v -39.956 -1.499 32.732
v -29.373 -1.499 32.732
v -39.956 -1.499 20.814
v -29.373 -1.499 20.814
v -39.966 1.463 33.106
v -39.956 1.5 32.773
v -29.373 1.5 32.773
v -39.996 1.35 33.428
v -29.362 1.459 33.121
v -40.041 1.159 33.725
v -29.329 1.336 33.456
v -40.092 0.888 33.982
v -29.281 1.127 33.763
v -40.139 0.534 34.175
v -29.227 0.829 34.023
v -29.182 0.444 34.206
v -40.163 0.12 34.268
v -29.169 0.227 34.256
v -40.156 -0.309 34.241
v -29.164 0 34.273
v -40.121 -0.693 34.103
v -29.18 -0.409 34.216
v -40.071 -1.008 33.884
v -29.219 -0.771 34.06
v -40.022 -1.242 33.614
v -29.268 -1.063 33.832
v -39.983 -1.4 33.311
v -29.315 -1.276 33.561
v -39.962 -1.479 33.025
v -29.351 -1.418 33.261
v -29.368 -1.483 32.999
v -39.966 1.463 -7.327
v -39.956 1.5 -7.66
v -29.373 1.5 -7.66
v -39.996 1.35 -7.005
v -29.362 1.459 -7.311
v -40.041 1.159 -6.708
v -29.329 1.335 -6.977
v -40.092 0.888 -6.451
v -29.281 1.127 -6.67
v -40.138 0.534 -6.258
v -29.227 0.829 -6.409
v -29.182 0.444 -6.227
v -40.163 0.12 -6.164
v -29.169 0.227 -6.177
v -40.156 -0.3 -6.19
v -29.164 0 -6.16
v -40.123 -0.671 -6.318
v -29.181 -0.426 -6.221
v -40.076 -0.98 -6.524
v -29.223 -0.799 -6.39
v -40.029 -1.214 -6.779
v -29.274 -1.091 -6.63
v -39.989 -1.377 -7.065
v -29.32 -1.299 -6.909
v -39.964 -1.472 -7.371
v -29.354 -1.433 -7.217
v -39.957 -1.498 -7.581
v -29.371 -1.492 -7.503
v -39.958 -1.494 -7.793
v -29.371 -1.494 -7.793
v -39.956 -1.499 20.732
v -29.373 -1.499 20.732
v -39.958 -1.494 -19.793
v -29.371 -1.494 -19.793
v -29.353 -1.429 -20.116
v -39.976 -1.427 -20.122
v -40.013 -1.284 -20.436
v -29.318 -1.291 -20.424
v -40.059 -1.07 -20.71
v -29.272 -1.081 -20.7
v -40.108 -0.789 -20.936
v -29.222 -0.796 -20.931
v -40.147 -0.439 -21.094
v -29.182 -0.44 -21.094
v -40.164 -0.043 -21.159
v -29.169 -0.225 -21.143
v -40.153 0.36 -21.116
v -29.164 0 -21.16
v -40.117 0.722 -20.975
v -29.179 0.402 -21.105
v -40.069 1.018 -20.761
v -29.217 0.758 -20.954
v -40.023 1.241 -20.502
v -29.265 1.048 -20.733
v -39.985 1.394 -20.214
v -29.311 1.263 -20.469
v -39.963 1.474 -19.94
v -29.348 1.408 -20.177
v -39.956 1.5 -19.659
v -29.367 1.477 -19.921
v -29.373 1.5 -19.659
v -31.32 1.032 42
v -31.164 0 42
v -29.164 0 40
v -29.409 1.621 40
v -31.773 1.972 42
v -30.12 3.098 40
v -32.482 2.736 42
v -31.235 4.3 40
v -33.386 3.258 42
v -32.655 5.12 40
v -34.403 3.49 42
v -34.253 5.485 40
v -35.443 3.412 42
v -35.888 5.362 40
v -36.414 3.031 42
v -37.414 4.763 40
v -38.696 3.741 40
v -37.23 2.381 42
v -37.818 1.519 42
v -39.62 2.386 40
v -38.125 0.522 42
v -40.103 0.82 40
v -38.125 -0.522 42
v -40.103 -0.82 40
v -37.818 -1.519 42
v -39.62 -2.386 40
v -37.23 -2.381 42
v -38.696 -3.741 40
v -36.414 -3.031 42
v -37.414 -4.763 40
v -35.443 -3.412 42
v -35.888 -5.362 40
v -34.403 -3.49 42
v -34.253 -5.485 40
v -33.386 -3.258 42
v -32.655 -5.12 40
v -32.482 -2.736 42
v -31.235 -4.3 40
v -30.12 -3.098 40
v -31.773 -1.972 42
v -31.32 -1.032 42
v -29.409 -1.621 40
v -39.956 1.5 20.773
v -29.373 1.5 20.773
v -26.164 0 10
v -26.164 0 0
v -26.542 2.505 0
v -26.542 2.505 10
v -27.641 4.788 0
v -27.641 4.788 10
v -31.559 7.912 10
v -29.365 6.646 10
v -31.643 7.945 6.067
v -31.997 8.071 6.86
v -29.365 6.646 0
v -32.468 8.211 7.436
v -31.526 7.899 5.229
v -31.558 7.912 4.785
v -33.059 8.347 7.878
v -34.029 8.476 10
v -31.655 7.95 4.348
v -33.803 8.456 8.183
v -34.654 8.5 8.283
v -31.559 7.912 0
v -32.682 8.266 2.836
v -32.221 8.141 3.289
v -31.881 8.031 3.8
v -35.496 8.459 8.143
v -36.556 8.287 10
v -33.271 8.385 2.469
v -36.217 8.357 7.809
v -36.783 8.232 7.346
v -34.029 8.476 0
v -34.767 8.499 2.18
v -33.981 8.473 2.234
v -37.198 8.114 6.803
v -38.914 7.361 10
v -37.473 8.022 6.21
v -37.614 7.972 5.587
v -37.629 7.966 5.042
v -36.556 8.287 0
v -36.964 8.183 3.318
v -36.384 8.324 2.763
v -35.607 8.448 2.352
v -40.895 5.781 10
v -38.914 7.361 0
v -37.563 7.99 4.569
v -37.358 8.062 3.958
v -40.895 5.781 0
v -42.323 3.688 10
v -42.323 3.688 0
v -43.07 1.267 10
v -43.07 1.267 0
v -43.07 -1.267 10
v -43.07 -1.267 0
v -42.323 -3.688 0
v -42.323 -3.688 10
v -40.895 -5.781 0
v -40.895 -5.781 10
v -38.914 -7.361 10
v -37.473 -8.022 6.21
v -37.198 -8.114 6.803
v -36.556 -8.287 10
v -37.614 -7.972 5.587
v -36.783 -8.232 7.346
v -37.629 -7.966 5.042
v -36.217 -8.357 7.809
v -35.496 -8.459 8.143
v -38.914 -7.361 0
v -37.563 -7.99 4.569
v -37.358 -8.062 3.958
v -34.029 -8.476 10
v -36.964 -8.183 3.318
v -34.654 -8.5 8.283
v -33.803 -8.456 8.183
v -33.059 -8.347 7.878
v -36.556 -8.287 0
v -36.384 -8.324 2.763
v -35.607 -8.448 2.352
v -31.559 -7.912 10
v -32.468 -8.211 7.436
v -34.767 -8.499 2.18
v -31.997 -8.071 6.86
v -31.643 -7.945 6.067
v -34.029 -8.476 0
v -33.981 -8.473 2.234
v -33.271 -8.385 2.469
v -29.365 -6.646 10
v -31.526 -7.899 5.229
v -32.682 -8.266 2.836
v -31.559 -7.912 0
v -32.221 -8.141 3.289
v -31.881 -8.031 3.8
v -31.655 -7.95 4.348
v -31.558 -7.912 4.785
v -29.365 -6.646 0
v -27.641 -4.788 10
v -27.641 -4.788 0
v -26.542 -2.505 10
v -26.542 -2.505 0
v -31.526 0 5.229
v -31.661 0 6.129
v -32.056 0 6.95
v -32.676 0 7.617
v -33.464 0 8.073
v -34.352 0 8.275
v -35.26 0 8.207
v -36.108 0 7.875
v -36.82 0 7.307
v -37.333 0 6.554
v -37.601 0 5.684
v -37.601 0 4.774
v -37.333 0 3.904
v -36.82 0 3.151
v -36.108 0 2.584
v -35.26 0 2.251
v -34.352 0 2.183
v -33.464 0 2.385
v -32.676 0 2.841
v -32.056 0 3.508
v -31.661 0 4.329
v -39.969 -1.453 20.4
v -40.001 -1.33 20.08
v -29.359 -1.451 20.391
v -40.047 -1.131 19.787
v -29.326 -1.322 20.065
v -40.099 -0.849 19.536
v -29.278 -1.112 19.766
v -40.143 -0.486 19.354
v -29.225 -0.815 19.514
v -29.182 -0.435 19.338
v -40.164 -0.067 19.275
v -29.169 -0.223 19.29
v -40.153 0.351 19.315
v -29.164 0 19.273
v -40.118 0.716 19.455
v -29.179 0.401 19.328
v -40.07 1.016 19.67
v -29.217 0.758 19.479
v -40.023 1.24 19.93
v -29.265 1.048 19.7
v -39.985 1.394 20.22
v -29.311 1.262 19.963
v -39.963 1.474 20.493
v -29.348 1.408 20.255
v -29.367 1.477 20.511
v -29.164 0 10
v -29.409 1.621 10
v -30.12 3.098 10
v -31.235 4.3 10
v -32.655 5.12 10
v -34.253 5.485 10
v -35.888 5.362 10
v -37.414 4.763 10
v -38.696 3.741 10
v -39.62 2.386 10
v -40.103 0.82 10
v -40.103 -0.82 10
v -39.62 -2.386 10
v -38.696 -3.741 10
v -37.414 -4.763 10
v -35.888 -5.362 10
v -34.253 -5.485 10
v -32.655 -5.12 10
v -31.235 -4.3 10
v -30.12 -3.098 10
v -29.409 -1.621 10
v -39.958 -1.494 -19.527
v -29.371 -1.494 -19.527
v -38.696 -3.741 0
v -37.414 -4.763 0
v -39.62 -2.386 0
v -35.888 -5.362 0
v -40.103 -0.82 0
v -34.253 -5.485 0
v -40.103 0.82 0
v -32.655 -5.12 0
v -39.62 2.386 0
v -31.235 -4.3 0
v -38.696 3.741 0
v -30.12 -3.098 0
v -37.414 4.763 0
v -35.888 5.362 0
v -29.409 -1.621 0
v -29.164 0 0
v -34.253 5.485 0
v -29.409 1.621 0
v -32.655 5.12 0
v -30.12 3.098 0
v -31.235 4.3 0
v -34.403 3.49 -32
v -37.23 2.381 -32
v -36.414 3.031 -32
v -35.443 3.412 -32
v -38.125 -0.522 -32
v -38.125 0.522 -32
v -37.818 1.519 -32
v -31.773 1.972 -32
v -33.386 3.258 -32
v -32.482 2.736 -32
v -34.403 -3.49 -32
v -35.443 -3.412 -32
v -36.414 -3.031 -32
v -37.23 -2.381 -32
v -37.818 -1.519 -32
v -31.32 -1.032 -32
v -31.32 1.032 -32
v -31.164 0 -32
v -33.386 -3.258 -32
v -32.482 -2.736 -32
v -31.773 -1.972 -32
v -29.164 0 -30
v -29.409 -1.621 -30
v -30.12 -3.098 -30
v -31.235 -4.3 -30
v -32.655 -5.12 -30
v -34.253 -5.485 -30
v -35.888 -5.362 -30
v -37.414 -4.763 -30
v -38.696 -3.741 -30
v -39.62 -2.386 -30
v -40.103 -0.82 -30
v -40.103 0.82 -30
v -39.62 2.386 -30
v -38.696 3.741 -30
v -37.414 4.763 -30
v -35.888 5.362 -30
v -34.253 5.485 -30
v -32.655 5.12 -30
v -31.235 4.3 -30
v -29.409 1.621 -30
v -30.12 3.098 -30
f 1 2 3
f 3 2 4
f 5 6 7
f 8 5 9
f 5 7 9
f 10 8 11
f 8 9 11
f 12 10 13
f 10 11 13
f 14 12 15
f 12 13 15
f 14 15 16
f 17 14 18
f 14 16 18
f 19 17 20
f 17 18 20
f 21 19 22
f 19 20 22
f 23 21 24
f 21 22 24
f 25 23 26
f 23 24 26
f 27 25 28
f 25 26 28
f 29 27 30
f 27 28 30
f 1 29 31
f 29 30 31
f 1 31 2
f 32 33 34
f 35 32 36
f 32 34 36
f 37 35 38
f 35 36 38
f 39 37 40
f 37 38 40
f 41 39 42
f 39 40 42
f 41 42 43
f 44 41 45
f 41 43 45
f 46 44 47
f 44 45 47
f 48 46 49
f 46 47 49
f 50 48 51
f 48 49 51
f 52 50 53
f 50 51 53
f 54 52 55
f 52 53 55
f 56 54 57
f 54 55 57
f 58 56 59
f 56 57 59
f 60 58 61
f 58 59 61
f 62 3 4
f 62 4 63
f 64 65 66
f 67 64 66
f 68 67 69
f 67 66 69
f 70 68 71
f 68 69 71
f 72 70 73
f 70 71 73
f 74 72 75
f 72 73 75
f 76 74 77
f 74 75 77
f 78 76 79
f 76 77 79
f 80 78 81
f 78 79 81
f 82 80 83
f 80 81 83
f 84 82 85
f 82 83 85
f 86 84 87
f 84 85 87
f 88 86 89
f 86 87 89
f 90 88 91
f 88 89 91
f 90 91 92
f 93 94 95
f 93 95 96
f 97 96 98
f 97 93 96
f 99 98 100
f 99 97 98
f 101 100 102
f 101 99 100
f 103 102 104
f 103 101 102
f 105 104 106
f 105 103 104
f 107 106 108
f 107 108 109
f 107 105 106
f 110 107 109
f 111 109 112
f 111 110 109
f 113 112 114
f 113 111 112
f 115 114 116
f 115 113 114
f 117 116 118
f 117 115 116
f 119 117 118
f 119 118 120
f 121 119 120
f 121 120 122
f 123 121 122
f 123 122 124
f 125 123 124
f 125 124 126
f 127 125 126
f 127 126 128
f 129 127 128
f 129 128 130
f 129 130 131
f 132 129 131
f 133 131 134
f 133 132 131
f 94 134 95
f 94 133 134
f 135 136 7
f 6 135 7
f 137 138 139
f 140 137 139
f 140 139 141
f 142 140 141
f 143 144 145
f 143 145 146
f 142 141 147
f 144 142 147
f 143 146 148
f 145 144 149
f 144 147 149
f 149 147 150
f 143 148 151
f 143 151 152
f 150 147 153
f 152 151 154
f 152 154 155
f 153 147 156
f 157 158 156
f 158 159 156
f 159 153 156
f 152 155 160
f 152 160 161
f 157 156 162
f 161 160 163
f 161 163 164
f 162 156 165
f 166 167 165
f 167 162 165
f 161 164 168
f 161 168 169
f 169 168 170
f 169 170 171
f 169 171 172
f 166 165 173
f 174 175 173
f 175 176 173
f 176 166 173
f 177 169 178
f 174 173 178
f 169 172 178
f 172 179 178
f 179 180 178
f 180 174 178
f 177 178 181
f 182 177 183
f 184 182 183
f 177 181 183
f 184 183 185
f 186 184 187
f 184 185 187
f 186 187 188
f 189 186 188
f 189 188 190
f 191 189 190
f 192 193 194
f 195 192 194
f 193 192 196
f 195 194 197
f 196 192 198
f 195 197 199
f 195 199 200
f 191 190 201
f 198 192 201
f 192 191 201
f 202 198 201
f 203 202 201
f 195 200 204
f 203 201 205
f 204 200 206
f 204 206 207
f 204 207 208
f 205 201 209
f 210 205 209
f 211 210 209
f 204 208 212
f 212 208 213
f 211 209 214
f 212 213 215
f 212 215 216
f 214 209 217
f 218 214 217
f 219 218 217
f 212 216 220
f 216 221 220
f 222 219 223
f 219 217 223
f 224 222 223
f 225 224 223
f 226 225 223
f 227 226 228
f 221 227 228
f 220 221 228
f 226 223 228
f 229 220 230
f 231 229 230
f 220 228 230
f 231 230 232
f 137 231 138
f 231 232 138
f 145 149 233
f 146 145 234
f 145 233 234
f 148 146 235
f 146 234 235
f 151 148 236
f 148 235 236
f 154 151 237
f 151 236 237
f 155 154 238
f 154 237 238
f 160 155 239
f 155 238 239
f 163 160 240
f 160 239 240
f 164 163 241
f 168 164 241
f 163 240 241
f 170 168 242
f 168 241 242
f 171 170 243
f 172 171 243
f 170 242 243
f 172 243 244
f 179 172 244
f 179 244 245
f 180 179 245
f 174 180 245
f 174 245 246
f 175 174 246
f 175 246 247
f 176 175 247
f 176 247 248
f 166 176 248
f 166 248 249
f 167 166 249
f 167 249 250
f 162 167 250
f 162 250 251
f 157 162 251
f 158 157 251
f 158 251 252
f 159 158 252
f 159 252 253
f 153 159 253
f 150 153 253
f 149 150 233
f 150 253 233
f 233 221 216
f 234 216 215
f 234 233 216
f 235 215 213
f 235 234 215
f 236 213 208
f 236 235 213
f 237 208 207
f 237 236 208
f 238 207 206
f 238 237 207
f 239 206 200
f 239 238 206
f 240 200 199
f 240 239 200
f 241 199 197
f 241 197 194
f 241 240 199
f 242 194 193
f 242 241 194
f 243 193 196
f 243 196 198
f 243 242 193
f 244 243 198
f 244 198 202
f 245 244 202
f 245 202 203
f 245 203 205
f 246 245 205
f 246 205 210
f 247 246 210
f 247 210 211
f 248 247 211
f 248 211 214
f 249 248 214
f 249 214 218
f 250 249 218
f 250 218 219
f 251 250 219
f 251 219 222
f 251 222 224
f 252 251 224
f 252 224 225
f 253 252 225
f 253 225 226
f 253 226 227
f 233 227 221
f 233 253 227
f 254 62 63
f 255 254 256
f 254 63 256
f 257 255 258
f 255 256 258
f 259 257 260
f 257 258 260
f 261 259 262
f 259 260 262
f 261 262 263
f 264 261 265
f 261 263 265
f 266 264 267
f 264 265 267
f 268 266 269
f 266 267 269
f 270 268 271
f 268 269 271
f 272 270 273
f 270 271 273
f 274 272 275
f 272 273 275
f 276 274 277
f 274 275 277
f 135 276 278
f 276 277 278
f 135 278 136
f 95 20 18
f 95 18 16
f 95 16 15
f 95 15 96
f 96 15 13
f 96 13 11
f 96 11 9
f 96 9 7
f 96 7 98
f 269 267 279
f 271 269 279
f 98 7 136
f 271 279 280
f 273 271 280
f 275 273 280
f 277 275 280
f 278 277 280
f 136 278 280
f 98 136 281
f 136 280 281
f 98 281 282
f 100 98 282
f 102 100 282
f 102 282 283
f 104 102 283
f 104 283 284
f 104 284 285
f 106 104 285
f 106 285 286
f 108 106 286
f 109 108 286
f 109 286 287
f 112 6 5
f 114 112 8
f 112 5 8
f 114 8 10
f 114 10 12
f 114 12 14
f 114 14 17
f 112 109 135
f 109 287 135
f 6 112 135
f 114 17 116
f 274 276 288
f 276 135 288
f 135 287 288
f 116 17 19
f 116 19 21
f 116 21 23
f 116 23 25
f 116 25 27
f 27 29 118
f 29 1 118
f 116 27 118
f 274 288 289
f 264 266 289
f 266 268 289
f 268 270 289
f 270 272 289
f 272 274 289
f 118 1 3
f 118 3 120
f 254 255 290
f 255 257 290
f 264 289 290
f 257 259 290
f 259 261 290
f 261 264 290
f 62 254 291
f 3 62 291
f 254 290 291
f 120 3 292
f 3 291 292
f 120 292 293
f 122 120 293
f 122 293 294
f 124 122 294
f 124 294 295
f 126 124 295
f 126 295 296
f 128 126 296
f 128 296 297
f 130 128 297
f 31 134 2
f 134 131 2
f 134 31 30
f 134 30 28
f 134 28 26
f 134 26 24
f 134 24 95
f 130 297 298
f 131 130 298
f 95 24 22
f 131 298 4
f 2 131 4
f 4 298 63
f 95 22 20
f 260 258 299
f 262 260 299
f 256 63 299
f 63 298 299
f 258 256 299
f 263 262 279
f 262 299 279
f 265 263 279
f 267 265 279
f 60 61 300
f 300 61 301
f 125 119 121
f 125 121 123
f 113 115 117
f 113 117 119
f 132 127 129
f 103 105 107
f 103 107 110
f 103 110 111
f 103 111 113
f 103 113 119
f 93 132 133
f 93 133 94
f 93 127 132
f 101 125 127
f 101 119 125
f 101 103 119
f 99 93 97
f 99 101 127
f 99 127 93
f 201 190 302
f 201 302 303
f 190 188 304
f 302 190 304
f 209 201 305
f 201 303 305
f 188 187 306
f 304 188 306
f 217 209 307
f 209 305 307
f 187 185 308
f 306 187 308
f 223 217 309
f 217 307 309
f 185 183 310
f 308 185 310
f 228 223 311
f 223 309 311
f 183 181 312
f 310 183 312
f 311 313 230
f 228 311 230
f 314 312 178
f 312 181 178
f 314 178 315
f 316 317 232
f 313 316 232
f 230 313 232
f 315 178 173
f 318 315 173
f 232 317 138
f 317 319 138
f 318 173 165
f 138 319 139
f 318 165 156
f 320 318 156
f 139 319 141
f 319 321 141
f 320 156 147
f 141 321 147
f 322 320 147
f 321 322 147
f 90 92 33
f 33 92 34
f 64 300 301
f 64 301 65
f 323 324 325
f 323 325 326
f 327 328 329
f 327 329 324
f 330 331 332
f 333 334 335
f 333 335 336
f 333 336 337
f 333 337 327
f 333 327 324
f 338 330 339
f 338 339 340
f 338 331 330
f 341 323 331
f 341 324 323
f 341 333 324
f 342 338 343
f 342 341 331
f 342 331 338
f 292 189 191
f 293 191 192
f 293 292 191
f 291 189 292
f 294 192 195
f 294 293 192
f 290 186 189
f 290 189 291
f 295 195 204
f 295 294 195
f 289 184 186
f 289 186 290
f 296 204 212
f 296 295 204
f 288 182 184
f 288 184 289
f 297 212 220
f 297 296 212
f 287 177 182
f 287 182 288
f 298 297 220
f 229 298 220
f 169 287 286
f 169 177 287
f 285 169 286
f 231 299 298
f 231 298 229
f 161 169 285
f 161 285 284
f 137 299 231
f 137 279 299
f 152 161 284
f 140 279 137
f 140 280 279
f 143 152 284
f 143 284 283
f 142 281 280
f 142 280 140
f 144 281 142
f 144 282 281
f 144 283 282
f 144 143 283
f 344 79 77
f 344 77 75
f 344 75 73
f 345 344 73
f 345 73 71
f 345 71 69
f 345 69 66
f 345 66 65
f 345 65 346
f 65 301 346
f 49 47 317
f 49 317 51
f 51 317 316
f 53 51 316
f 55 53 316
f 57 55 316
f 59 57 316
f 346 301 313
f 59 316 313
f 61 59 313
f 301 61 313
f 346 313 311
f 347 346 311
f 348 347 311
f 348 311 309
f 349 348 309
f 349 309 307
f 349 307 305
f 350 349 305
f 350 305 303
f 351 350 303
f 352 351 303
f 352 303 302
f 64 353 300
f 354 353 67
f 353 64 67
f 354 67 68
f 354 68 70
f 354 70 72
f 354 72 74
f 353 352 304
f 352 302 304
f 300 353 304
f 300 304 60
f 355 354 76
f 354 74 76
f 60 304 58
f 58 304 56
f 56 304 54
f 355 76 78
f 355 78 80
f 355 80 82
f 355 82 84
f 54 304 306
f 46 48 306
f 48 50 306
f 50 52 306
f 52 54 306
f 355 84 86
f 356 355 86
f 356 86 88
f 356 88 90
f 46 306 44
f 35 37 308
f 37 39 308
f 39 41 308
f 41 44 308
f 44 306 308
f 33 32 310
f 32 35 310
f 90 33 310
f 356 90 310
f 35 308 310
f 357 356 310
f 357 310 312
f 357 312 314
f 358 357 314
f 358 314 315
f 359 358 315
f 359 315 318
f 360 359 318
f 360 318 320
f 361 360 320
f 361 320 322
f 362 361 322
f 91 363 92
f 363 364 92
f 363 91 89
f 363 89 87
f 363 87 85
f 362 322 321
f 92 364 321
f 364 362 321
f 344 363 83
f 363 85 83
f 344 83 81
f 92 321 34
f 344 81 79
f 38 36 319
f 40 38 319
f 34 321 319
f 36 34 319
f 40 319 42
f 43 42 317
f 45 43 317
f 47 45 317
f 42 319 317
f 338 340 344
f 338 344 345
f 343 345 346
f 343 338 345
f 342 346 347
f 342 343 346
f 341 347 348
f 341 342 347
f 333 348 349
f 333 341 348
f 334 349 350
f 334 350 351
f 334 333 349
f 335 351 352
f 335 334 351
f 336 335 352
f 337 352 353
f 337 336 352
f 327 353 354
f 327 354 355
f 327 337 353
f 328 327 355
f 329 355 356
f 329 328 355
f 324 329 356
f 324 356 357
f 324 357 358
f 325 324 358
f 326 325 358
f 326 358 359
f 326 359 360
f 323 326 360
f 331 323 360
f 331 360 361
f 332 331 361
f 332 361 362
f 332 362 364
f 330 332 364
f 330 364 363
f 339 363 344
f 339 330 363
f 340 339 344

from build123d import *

# Parameters (mm, degrees)
F0_R          = 8.5
F1_DEPTH      = 10
F2_R          = 5.5
F3_DEPTH      = 32
F4_R          = 5.5
F5_DEPTH      = 32
F6_SIZE       = 2
F7_SIZE       = 2
F8_R          = 3.0547772324
F9_DEPTH      = 8.501
F9_DEPTH_BACK = 8.501
F11_DEPTH     = 43.1654968794
F13_DEPTH     = 43.1654968794


with BuildPart() as f1:
    # F0 (on Top) → F1 (new body)
    with BuildSketch(Plane.XY):
        with Locations((-34.6644967794, 0)):
            Circle(F0_R)
    extrude(amount=F1_DEPTH)

    # F2 (on face) → F3 (join)
    with BuildSketch(Plane.XY.offset(10)):
        with Locations((-34.6644967794, 0)):
            Circle(F2_R)
    extrude(amount=F3_DEPTH)

    # F4 (on face) → F5 (join)
    with BuildSketch(Plane(origin=(0, 0, 0), x_dir=(1, 0, 0), z_dir=(0, 0, -1))):
        with Locations((-34.6644967794, 0)):
            Circle(F4_R)
    extrude(amount=F5_DEPTH)

    # F6
    f6_edges = [f1.edges().sort_by_distance(p)[0] for p in [
        (-40.164497, 0, 42),
    ]]
    chamfer(f6_edges, length=F6_SIZE)

    # F7
    f7_edges = [f1.edges().sort_by_distance(p)[0] for p in [
        (-40.164497, 0, -32),
    ]]
    chamfer(f7_edges, length=F7_SIZE)

    # F8 (on Front) → F9 (cut, two sides)
    with BuildSketch(Plane.XZ) as f9_sk:
        with Locations((-34.5804058015, 5.2290405147)):
            Circle(F8_R)
    extrude(amount=-F9_DEPTH, mode=Mode.SUBTRACT)
    extrude(f9_sk.sketch, amount=F9_DEPTH_BACK, mode=Mode.SUBTRACT)

    # F10 (on Right) → F11 (cut, through all)
    with BuildSketch(Plane.YZ):
        with BuildLine():
            Line((1.5, 20.7730699331), (1.5, 32.7730699331))
            ThreePointArc((1.5, 32.7730699331), (-0.0205803002, 34.2729287435), (-1.4994352683, 32.731913207))
            Line((-1.4994352683, 32.731913207), (-1.4994352683, 20.8142266592))
            Line((-1.4994352683, 20.8142266592), (-1.4994352683, 20.731913207))
            ThreePointArc((-1.4994352683, 20.731913207), (0.0205803002, 19.2732111226), (1.5, 20.7730699331))
        make_face()
        with BuildLine():
            Line((-1.4994352683, 20.731913207), (-1.4994352683, 20.8142266592))
            ThreePointArc((-1.4994352683, 20.8142266592), (-1.5, 20.7730699331), (-1.4994352683, 20.731913207))
        make_face()
    extrude(amount=-F11_DEPTH, mode=Mode.SUBTRACT)

    # F12 (on Right) → F13 (cut, through all)
    with BuildSketch(Plane.YZ):
        with BuildLine():
            Line((-1.4940902409, -19.792623133), (-1.4940902409, -19.5265828961))
            ThreePointArc((-1.4940902409, -19.5265828961), (-1.5, -19.6596030146), (-1.4940902409, -19.792623133))
        make_face()
        with BuildLine():
            Line((-1.4940902409, -7.792623133), (-1.4940902409, -19.5265828961))
            Line((-1.4940902409, -19.5265828961), (-1.4940902409, -19.792623133))
            ThreePointArc((-1.4940902409, -19.792623133), (0.0669880568, -21.1581064681), (1.4999997728, -19.6587774142))
            Line((1.4999997728, -19.6587774142), (1.5, -7.6596030146))
            ThreePointArc((1.5, -7.659603043), (-0.0665756517, -6.161081182), (-1.4940902409, -7.792623133))
        make_face()
    extrude(amount=-F13_DEPTH, mode=Mode.SUBTRACT)


solid = f1.part
